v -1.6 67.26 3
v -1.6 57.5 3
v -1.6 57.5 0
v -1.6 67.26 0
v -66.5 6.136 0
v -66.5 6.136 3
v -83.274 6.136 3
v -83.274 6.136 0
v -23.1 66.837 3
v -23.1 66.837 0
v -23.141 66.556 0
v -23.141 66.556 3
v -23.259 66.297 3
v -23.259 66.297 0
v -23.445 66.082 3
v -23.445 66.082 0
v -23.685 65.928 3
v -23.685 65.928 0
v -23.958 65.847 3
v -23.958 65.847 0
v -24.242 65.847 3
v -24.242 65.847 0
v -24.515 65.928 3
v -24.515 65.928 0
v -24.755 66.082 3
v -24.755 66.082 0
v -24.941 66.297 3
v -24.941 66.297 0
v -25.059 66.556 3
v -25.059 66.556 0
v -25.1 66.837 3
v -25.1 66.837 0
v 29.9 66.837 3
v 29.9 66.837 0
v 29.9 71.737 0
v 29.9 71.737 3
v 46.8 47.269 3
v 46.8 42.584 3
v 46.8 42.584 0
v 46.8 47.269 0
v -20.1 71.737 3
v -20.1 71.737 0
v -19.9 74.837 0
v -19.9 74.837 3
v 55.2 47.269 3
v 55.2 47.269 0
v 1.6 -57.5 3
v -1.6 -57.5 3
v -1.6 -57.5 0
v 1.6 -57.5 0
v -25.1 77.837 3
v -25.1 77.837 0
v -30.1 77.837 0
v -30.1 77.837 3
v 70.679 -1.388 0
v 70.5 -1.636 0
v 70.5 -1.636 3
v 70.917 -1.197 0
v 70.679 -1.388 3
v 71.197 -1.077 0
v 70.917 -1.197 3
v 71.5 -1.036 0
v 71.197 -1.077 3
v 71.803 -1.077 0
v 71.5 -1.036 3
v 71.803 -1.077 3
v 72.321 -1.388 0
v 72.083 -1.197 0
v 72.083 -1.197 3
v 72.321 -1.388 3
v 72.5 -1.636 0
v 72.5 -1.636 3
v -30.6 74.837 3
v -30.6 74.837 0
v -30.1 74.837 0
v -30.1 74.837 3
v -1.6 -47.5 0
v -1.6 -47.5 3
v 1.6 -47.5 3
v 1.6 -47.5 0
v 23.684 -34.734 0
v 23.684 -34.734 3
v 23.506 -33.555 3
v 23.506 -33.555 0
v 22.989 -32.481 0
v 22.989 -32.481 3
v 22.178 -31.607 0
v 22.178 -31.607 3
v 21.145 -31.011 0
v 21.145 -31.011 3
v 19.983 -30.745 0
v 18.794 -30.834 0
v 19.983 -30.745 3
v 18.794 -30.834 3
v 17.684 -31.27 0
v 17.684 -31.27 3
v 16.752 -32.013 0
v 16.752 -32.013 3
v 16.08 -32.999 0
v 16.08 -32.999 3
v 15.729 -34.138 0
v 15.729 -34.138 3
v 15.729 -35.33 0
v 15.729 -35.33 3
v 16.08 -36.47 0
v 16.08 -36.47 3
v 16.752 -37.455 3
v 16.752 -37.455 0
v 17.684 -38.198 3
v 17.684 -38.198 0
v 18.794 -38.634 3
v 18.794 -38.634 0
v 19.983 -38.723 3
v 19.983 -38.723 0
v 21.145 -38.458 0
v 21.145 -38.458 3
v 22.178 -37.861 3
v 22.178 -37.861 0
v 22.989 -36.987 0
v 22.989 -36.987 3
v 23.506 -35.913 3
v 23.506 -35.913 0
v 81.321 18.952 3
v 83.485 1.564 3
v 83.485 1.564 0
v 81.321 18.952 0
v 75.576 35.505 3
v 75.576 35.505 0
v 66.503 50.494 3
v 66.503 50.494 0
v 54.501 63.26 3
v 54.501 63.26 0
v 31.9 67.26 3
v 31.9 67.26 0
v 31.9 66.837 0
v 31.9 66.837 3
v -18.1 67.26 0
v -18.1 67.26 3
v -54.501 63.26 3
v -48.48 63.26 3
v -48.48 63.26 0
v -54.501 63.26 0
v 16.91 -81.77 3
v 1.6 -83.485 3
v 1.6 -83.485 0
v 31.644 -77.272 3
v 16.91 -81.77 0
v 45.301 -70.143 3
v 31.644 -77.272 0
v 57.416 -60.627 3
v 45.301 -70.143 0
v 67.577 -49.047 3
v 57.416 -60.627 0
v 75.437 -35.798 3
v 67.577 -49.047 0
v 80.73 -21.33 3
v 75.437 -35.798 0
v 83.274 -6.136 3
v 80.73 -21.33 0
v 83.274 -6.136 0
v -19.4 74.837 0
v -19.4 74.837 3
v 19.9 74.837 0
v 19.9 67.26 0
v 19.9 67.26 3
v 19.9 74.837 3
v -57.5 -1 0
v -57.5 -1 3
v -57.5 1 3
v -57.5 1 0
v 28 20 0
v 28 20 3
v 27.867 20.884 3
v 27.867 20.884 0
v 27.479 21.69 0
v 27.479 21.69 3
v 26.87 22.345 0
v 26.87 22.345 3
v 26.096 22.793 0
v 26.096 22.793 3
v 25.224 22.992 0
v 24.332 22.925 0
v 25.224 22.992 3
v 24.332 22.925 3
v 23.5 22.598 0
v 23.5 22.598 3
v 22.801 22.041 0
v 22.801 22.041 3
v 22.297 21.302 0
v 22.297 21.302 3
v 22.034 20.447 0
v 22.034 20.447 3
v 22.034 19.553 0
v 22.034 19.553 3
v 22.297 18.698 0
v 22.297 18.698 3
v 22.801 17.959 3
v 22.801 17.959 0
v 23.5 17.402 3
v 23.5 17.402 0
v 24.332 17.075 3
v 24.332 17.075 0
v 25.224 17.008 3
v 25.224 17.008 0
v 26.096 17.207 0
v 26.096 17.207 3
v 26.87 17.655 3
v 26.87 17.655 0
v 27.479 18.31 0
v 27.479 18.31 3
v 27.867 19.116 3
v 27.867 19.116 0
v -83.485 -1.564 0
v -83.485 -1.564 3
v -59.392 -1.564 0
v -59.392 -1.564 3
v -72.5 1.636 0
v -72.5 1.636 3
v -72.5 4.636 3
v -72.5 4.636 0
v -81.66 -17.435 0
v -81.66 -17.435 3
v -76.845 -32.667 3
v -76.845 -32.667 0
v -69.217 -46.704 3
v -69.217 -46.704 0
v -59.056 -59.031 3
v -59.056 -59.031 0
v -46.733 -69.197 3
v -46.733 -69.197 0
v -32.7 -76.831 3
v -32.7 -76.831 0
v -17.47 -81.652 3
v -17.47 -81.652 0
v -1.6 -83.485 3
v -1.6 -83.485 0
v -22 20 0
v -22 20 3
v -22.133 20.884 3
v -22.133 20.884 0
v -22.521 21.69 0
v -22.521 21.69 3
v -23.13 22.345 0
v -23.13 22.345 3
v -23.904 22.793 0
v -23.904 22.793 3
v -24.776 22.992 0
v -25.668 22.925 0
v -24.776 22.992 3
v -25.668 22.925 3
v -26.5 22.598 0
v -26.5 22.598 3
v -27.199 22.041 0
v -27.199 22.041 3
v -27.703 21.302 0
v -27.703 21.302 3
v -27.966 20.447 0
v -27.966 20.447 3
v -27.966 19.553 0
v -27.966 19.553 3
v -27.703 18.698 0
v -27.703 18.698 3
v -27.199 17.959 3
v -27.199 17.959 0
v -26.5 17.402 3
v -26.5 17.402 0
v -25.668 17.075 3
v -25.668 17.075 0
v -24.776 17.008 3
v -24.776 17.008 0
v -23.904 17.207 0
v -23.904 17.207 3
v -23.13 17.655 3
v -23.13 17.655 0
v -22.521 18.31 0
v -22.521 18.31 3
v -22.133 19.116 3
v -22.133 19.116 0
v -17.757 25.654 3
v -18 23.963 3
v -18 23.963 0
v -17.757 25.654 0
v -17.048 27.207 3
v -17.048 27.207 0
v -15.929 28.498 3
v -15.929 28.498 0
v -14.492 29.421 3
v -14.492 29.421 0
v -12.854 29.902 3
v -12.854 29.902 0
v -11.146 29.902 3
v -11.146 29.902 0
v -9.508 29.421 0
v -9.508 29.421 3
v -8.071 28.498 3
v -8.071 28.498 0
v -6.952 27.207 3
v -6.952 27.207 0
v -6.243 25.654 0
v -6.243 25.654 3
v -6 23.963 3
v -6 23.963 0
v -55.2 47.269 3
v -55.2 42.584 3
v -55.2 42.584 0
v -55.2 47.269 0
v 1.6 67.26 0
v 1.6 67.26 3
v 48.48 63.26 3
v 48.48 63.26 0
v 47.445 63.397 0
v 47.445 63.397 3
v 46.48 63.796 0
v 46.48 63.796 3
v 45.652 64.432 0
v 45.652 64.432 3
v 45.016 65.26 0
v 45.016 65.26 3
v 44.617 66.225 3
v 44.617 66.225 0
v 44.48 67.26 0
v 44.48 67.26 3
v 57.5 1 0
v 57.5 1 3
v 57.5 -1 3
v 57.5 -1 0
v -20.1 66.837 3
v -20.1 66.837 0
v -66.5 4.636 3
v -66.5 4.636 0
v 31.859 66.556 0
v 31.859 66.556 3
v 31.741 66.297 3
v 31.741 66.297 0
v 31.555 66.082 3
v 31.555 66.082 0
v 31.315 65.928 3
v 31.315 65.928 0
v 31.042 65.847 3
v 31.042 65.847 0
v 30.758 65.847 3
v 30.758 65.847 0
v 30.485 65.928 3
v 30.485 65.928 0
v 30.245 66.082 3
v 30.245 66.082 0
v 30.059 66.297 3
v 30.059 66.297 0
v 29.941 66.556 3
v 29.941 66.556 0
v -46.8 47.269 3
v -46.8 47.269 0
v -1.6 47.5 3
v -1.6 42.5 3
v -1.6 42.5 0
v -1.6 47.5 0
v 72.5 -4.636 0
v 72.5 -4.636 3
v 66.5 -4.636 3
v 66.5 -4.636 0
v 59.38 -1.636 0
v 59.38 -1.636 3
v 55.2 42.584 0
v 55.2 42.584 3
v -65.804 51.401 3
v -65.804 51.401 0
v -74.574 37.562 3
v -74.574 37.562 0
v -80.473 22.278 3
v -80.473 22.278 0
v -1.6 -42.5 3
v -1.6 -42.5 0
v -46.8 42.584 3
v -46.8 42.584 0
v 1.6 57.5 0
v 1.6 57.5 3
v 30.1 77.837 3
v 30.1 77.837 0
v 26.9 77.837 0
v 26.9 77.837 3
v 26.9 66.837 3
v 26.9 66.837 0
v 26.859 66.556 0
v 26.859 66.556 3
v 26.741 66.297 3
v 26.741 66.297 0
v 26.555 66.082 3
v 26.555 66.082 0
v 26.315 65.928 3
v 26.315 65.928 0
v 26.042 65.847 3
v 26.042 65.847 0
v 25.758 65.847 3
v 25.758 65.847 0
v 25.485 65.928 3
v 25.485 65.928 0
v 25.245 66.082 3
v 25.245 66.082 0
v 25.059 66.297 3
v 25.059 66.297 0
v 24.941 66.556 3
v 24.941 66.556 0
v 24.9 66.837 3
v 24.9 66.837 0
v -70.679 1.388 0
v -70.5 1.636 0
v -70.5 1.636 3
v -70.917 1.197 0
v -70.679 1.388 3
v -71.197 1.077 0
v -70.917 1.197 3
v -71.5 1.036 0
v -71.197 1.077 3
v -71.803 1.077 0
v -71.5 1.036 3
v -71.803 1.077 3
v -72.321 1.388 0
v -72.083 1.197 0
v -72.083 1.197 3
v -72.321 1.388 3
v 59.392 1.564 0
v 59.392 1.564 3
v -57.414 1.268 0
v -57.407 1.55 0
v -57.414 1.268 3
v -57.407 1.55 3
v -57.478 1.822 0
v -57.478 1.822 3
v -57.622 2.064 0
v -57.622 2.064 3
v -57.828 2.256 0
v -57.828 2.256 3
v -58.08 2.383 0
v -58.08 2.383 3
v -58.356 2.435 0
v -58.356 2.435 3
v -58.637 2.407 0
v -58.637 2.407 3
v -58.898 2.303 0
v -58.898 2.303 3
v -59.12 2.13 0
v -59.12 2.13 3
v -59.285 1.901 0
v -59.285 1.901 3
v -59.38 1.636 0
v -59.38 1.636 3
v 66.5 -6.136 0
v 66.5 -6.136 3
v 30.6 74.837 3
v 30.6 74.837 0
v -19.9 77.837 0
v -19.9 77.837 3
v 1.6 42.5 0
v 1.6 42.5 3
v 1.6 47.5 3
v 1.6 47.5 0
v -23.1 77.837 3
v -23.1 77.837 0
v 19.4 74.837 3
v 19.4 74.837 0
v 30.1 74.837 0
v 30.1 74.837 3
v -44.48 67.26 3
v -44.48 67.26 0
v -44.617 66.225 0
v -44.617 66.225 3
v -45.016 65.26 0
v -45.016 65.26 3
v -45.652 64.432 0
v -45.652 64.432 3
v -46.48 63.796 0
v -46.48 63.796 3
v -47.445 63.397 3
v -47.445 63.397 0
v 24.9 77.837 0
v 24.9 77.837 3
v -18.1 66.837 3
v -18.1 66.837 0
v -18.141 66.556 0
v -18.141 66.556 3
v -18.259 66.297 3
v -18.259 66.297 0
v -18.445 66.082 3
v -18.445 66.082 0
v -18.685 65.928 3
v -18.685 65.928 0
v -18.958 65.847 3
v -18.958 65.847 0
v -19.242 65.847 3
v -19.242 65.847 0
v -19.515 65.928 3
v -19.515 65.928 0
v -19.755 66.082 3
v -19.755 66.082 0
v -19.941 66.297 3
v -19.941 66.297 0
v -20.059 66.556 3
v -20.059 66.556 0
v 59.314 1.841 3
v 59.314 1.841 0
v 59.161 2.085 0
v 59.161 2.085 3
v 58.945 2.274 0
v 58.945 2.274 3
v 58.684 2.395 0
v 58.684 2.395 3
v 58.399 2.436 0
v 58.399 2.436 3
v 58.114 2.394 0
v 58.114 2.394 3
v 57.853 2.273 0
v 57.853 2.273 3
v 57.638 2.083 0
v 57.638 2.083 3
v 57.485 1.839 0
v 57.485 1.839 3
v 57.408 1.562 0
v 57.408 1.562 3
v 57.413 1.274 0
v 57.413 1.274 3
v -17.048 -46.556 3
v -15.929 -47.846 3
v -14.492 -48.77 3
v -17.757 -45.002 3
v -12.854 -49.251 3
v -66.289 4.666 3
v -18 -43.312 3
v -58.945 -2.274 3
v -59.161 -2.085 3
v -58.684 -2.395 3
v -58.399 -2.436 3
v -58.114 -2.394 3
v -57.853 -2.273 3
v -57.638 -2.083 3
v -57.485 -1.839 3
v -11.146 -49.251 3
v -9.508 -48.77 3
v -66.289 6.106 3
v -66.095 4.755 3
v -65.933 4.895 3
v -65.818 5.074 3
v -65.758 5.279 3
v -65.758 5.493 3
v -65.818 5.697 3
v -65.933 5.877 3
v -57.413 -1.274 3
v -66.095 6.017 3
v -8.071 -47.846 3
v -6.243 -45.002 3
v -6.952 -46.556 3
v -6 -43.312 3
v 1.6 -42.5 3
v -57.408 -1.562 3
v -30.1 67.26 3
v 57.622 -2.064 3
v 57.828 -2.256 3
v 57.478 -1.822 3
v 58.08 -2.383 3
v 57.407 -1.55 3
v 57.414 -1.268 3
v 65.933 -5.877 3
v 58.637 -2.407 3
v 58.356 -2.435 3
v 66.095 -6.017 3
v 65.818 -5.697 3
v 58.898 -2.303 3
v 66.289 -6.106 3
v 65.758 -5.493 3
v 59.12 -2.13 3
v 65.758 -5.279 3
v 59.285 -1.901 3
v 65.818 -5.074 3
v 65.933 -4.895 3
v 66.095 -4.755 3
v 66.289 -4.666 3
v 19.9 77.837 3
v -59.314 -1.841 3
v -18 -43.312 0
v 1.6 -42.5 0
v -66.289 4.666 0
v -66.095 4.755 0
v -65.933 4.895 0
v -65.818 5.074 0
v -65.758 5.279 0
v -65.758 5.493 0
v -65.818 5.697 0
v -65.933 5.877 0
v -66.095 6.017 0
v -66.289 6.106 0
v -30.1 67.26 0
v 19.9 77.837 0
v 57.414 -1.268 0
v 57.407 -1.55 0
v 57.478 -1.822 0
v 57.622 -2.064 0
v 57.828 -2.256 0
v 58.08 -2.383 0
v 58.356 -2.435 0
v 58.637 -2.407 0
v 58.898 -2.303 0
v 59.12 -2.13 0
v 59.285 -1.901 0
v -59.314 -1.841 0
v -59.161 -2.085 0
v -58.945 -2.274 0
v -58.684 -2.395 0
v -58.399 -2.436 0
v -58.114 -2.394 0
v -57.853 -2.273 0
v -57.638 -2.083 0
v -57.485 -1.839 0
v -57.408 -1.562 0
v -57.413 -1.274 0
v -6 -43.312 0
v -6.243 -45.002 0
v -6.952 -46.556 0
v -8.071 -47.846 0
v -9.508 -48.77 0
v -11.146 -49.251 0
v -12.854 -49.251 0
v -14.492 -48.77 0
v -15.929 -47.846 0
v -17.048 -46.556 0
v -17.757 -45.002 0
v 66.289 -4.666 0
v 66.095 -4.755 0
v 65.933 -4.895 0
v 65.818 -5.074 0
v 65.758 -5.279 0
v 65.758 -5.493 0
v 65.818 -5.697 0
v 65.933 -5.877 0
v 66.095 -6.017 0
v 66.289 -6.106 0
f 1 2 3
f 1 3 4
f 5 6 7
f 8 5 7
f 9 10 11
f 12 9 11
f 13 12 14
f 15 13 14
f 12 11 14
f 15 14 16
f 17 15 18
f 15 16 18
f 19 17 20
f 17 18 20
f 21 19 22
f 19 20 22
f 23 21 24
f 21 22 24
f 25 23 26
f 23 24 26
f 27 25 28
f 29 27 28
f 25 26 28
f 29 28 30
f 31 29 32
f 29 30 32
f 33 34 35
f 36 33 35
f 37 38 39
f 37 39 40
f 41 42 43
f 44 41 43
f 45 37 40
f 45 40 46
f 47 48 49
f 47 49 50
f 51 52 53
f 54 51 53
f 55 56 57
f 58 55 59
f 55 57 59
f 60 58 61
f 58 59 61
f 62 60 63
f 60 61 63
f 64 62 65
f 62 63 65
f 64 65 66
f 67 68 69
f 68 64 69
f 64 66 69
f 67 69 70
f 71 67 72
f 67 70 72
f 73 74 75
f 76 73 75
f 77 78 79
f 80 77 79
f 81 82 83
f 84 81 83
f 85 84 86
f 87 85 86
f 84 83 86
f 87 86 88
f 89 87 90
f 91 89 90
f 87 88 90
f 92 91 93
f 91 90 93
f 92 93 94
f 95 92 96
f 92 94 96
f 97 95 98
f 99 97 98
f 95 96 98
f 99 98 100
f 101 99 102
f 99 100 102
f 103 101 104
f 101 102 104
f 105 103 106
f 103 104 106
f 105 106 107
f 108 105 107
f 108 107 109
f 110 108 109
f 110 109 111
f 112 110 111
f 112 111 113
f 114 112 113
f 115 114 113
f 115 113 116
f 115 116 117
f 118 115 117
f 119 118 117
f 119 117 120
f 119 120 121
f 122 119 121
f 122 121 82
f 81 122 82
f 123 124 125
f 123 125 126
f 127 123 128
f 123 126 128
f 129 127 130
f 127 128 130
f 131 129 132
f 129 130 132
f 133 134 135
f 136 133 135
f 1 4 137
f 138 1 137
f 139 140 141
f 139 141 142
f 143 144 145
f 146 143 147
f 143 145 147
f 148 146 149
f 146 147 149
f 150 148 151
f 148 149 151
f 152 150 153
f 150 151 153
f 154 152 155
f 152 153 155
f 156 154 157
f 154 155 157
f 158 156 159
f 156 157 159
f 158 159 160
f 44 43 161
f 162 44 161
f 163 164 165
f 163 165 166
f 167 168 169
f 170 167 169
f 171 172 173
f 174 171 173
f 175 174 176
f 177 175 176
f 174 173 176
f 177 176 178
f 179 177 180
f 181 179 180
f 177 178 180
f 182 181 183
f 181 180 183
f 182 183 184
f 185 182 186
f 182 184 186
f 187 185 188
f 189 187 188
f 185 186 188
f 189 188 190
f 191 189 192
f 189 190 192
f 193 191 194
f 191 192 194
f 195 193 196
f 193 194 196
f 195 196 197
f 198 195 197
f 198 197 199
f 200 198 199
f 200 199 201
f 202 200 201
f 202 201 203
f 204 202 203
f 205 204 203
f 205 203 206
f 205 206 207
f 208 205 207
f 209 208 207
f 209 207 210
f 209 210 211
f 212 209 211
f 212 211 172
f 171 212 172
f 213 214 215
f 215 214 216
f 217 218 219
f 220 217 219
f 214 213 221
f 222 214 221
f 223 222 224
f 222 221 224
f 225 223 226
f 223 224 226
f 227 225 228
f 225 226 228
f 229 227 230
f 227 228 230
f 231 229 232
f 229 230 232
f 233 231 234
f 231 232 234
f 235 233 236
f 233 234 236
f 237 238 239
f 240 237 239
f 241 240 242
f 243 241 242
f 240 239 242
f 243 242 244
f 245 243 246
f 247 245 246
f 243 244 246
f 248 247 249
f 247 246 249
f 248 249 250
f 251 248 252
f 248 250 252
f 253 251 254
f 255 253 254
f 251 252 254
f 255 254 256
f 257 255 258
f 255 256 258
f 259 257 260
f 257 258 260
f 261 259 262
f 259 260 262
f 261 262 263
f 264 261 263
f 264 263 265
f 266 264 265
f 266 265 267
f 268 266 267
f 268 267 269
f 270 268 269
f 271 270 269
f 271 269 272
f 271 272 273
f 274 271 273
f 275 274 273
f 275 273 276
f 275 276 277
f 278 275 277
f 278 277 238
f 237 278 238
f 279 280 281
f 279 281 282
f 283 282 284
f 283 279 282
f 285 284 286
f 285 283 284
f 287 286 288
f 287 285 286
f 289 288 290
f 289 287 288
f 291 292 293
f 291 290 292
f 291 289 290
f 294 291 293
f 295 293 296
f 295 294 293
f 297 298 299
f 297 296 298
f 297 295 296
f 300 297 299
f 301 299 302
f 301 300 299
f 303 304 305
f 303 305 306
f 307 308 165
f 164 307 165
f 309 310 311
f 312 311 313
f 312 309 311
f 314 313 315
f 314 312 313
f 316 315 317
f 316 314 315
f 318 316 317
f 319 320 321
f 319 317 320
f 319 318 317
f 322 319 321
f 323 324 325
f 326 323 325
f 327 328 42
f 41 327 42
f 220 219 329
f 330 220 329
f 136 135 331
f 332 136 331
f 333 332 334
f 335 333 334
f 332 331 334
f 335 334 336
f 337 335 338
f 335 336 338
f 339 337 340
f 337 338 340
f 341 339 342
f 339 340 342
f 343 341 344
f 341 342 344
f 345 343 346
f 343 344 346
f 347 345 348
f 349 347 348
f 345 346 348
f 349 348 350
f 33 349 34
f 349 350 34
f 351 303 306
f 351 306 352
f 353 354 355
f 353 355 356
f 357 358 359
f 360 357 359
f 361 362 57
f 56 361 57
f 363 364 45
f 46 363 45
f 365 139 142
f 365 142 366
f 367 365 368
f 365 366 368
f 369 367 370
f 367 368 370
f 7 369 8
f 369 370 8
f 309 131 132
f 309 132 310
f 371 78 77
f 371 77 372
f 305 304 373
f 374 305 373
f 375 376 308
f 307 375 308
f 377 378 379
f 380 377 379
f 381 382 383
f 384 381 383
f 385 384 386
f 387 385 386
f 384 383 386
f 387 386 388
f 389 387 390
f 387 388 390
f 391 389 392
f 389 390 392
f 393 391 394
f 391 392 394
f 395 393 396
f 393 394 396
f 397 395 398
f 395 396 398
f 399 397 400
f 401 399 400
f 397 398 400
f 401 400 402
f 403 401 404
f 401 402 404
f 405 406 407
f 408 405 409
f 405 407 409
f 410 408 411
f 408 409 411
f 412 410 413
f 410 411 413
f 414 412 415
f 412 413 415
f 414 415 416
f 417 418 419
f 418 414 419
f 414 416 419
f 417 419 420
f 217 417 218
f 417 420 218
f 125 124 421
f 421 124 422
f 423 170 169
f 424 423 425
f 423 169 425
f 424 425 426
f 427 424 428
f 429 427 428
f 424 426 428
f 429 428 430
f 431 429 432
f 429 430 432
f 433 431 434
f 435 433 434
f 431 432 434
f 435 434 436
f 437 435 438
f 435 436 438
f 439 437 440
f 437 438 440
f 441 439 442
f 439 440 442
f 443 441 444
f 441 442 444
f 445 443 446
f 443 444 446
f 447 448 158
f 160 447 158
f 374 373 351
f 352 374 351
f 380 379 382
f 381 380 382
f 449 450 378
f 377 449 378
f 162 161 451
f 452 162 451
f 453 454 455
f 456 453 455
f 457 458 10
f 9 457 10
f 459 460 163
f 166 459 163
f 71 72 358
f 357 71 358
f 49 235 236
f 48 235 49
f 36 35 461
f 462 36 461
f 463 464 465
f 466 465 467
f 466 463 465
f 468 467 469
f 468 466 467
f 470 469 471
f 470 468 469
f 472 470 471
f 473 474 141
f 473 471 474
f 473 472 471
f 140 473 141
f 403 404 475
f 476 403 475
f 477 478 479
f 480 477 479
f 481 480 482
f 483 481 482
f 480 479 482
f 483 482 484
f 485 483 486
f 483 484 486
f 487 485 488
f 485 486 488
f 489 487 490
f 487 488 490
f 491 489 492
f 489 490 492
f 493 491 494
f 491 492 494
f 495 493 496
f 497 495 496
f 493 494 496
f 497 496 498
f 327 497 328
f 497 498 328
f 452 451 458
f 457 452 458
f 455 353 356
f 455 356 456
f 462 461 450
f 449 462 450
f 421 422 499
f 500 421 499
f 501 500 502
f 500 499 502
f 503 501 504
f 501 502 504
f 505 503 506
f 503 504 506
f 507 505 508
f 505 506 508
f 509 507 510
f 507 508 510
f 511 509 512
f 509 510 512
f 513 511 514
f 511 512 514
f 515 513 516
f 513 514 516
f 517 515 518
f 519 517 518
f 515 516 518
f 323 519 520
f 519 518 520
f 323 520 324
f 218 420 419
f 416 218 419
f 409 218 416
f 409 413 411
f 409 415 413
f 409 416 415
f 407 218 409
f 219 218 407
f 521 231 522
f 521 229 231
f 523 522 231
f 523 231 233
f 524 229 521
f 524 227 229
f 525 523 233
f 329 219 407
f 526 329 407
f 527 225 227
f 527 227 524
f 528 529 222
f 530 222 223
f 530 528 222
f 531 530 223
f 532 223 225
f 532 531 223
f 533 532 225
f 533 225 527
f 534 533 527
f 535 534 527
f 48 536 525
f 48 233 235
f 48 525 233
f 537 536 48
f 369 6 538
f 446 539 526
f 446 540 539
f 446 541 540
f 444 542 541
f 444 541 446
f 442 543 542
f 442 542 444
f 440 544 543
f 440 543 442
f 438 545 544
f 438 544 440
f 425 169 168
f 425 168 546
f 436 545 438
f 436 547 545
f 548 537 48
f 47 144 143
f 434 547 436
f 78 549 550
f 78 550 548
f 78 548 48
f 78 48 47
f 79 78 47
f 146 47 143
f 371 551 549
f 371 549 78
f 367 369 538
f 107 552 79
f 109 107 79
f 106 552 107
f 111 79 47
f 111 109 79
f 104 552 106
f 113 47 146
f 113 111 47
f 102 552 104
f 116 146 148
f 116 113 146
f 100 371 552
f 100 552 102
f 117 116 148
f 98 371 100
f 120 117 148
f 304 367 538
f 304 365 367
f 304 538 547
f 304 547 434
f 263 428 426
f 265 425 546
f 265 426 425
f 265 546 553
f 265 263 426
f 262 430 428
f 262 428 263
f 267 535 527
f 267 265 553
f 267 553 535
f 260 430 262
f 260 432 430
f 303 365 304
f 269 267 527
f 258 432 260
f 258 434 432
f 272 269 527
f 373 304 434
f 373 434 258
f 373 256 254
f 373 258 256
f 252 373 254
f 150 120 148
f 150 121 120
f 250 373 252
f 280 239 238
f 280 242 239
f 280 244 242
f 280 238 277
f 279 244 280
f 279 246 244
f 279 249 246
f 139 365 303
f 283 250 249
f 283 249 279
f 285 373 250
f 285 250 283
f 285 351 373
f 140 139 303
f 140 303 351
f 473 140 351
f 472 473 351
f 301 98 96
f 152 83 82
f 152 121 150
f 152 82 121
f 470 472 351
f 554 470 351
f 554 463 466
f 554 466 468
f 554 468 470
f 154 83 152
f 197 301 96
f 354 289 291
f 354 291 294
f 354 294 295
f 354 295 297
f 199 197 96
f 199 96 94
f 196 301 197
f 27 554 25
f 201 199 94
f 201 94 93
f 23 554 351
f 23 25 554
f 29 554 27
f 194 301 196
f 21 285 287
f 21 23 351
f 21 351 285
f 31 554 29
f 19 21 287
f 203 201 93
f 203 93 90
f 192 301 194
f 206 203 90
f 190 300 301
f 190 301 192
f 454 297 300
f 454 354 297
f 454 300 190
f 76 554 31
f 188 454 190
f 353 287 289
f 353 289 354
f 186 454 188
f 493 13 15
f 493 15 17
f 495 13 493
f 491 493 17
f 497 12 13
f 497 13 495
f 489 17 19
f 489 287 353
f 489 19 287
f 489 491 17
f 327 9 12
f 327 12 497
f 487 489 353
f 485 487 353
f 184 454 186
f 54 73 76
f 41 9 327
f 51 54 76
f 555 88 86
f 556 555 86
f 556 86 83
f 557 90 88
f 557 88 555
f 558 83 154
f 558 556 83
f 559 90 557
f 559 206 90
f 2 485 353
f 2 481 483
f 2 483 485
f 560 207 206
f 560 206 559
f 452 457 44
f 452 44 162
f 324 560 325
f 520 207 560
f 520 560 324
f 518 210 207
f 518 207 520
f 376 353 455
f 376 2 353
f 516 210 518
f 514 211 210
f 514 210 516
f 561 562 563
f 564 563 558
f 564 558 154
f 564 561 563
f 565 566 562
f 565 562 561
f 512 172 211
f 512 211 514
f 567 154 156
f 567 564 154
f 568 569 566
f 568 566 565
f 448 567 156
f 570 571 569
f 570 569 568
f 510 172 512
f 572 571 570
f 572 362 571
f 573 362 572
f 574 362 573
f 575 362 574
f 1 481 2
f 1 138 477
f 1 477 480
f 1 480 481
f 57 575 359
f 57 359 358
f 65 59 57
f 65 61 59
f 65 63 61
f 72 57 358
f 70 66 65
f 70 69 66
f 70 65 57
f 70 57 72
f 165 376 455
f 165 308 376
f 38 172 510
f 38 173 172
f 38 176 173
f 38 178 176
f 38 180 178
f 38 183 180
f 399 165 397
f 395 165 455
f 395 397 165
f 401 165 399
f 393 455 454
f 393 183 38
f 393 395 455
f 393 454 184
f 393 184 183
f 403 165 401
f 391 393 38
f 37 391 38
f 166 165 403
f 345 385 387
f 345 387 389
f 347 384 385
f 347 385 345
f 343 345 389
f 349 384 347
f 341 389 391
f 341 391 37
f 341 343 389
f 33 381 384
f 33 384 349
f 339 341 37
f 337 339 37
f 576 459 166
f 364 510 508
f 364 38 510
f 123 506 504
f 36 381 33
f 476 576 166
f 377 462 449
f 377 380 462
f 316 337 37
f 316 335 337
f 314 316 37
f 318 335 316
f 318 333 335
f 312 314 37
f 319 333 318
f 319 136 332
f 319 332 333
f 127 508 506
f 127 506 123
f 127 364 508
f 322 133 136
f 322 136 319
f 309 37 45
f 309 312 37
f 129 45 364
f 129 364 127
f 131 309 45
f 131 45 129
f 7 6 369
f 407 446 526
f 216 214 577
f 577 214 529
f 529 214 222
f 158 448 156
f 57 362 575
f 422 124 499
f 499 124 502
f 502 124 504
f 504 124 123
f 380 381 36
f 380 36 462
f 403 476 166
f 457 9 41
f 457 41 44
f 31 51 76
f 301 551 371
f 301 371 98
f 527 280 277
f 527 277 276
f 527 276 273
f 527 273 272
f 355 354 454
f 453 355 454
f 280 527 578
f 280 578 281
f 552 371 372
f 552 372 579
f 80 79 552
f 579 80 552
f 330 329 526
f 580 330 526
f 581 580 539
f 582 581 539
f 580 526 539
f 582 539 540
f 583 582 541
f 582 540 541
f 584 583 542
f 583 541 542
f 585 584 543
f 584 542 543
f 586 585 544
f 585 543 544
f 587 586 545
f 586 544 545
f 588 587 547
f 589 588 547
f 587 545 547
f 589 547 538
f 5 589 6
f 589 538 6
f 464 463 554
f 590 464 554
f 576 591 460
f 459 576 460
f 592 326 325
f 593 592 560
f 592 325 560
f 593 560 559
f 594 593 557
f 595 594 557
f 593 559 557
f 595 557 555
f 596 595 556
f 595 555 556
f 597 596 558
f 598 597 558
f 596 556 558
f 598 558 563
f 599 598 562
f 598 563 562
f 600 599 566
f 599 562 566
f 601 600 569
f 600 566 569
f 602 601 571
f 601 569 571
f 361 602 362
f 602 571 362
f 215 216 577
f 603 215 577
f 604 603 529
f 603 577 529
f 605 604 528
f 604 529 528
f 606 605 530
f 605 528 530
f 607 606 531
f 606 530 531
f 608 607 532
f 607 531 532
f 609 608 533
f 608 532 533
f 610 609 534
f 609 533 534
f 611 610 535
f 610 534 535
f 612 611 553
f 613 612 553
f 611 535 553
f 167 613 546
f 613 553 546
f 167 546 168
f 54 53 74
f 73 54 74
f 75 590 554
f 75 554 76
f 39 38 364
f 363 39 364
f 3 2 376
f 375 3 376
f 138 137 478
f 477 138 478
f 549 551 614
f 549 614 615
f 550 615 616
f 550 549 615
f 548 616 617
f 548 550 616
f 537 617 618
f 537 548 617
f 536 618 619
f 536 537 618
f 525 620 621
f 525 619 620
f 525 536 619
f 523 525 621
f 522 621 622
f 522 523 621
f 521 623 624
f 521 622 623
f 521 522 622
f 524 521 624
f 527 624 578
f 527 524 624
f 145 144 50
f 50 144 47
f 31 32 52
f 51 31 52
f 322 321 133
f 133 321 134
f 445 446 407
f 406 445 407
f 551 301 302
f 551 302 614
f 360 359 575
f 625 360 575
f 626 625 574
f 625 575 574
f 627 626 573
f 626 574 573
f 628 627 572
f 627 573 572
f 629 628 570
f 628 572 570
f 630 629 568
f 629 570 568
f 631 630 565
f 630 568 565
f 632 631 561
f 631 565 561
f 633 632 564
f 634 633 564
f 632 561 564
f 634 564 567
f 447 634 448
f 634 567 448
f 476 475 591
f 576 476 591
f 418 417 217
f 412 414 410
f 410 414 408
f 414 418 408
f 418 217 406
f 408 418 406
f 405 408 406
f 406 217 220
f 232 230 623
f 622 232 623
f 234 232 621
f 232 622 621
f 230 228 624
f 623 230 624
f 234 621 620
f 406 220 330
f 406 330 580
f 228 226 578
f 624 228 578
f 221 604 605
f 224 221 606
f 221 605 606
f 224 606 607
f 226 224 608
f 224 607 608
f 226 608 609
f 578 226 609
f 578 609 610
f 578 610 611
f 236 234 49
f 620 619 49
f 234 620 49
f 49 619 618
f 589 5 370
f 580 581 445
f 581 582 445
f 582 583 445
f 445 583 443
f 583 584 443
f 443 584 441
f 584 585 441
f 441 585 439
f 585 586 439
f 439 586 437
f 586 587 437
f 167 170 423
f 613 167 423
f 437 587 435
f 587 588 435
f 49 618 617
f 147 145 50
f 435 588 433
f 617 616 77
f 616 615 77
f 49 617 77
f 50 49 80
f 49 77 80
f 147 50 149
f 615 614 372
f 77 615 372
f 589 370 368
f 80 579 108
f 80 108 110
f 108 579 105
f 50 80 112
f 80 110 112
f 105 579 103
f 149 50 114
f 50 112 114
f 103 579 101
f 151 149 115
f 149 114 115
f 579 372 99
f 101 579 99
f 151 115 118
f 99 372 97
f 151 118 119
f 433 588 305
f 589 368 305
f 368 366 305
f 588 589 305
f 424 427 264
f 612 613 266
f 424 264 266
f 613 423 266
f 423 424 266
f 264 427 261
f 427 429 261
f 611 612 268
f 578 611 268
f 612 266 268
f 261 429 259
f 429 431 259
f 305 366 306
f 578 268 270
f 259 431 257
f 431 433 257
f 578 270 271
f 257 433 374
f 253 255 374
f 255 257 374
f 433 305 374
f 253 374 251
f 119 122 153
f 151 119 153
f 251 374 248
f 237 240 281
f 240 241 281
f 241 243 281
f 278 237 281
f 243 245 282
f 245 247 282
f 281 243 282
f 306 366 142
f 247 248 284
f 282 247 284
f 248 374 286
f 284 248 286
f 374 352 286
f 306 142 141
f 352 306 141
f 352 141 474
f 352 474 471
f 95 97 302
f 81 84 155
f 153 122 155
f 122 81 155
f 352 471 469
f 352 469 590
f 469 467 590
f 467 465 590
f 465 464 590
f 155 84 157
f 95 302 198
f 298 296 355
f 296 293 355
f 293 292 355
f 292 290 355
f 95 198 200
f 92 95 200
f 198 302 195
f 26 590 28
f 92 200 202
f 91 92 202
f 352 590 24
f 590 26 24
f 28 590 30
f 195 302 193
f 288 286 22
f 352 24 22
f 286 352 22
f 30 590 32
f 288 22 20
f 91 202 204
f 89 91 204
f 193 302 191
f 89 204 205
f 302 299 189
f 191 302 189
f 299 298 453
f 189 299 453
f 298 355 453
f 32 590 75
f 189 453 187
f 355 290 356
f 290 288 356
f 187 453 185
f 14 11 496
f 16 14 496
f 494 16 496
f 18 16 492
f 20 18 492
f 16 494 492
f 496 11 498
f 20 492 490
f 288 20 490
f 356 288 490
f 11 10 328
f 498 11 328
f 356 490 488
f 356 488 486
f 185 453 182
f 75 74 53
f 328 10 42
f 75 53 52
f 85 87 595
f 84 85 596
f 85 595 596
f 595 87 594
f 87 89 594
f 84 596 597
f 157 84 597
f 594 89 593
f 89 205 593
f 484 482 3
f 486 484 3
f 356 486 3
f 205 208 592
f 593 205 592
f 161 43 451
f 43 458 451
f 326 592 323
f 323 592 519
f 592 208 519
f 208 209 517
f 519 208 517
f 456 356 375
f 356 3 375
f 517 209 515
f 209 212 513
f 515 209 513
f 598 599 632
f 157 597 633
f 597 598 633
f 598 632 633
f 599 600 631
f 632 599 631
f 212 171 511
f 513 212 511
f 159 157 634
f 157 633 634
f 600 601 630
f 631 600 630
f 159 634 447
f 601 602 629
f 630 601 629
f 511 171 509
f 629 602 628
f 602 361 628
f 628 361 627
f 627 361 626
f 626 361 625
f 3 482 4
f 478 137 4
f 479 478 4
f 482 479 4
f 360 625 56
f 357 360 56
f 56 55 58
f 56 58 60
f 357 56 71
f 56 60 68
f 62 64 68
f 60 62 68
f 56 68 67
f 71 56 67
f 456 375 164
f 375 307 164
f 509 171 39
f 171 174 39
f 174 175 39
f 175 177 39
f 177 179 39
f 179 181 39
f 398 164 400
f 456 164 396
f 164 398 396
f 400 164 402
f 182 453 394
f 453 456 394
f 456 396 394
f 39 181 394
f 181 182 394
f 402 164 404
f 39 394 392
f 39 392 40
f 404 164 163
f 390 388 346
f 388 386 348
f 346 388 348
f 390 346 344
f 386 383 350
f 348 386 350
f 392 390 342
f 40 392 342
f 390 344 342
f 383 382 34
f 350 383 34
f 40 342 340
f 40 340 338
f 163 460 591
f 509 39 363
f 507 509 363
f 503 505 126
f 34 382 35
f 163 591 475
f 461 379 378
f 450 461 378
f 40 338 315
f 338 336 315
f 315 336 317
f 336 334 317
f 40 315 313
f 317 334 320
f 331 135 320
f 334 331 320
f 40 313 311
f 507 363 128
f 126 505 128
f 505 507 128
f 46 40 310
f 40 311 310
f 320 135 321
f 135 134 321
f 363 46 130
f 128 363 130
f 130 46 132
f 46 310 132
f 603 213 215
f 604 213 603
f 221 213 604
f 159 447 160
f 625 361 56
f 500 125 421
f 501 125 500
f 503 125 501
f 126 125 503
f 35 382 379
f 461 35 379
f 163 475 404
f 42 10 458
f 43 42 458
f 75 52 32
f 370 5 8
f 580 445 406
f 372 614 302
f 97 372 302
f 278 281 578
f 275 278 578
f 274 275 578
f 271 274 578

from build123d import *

# Parameters (mm, degrees)
SKETCH1_R                     = 83.5
BOSS_EXTRUDE1_DEPTH           = 3
FACE_FLATTENING_REACH         = 120.125
SKETCH10_W                    = 98.960633138
SKETCH10_H                    = 16.23969765
SIDE_RIB_SLOT_DEPTH           = 10
RIB_TAB_CLEARANCE_SLOT_REACH  = 120.125
SKETCH5_W                     = 3.2
SKETCH5_H                     = 5
SKETCH5_H_2                   = 26
SIDE_RIB_SLOT_PATTERN_COUNT   = 2
EYE_PLATE_SLOTS_REACH         = 120.104
SKETCH3_R                     = 3
SKETCH3_W                     = 8.4
SKETCH3_H                     = 4.684444021
FACE_START                    = -3
FACE_PLATE_TABS_OUTLINE_W     = 2
FACE_PLATE_TABS_OUTLINE_H     = 4.476977338
FACE_PLATE_TABS_DEPTH         = 3
SKETCH11_W                    = 2
SKETCH11_H                    = 4.476977338
FACE_PLATE_TAB_RELIEF_DEPTH   = 3
ACTUATOR_CLEARANCE_SLOT_REACH = 120.104
SKETCH4_R                     = 4
EYE_PLATE_RELIEF_REACH        = 120.104


# Read off the part's stored shape, not the designer's step: face plate tabs
with BuildPart() as part:
    # Sketch1 → Boss-Extrude1 (new body)
    with BuildSketch(Plane.XY):
        Circle(SKETCH1_R)
    extrude(amount=BOSS_EXTRUDE1_DEPTH)

    # Sketch10 → face flattening (cut, up to next)
    with BuildSketch(Plane.XY.offset(3), mode=Mode.PRIVATE) as face_flattening_sk1:
        with Locations((0, 75.380151175)):
            Rectangle(SKETCH10_W, SKETCH10_H)
    face_flattening_tool1 = extrude(face_flattening_sk1.sketch, amount=-FACE_FLATTENING_REACH, mode=Mode.PRIVATE) & part.part
    add(face_flattening_tool1.solids().sort_by_distance((0, 75.380151, 3))[0], mode=Mode.SUBTRACT)

    # Sketch7 → side rib slot (cut)
    with BuildSketch(Plane.XY.offset(3)):
        with BuildLine():
            Line((-72.5, 1.635889894), (-72.5, 4.635889894))
            Line((-72.5, 4.635889894), (-66.5, 4.635889894))
            ThreePointArc((-66.5, 4.635889894), (-65.75, 5.385889894), (-66.5, 6.135889894))
            Line((-66.5, 6.135889894), (-87.5, 6.135889894))
            Line((-87.5, 6.135889894), (-87.5, -1.564110106))
            Line((-87.5, -1.564110106), (-72.5, -1.564110106))
            Line((-72.5, -1.564110106), (-59.391745722, -1.564110106))
            ThreePointArc((-59.391745722, -1.564110106), (-58.11423896, -2.394190801), (-57.5, -1))
            Line((-57.5, -1), (-57.5, 1))
            ThreePointArc((-57.5, 1), (-58.079561495, 2.383159214), (-59.379795897, 1.635889894))
            Line((-59.379795897, 1.635889894), (-70.5, 1.635889894))
            ThreePointArc((-70.5, 1.635889894), (-71.5, 1.035889894), (-72.5, 1.635889894))
        make_face()
    side_rib_slot = extrude(amount=-SIDE_RIB_SLOT_DEPTH, mode=Mode.SUBTRACT)

    # Sketch5 → rib tab clearance slot (cut, up to next)
    with BuildSketch(Plane.XY.offset(3), mode=Mode.PRIVATE) as rib_tab_clearance_slot_sk1:
        with Locations((0, 45)):
            Rectangle(SKETCH5_W, SKETCH5_H)
    rib_tab_clearance_slot_tool1 = extrude(rib_tab_clearance_slot_sk1.sketch, amount=-RIB_TAB_CLEARANCE_SLOT_REACH, mode=Mode.PRIVATE) & part.part
    # Sketch5 → rib tab clearance slot (cut, up to next)
    with BuildSketch(Plane.XY.offset(3), mode=Mode.PRIVATE) as rib_tab_clearance_slot_sk2:
        with Locations((0, 70.5)):
            Rectangle(SKETCH5_W, SKETCH5_H_2)
    rib_tab_clearance_slot_tool2 = extrude(rib_tab_clearance_slot_sk2.sketch, amount=-RIB_TAB_CLEARANCE_SLOT_REACH, mode=Mode.PRIVATE) & part.part
    # Sketch5 → rib tab clearance slot (cut, up to next)
    with BuildSketch(Plane.XY.offset(3), mode=Mode.PRIVATE) as rib_tab_clearance_slot_sk3:
        with Locations((0, -70.5)):
            Rectangle(SKETCH5_W, SKETCH5_H_2)
    rib_tab_clearance_slot_tool3 = extrude(rib_tab_clearance_slot_sk3.sketch, amount=-RIB_TAB_CLEARANCE_SLOT_REACH, mode=Mode.PRIVATE) & part.part
    # Sketch5 → rib tab clearance slot (cut, up to next)
    with BuildSketch(Plane.XY.offset(3), mode=Mode.PRIVATE) as rib_tab_clearance_slot_sk4:
        with Locations((0, -45)):
            Rectangle(SKETCH5_W, SKETCH5_H)
    rib_tab_clearance_slot_tool4 = extrude(rib_tab_clearance_slot_sk4.sketch, amount=-RIB_TAB_CLEARANCE_SLOT_REACH, mode=Mode.PRIVATE) & part.part
    add(rib_tab_clearance_slot_tool1.solids().sort_by_distance((0, 45, 3))[0], mode=Mode.SUBTRACT)
    add(rib_tab_clearance_slot_tool2.solids().sort_by_distance((0, 70.5, 3))[0], mode=Mode.SUBTRACT)
    add(rib_tab_clearance_slot_tool3.solids().sort_by_distance((0, -70.5, 3))[0], mode=Mode.SUBTRACT)
    add(rib_tab_clearance_slot_tool4.solids().sort_by_distance((0, -45, 3))[0], mode=Mode.SUBTRACT)

    # side rib slot pattern: side rib slot ×2 about axis
    side_rib_slot_pattern_axis = Axis((0, 0, 0), (0, 0, 1))
    for i in range(1, SIDE_RIB_SLOT_PATTERN_COUNT):
        add(side_rib_slot.rotate(side_rib_slot_pattern_axis, i * 360 / SIDE_RIB_SLOT_PATTERN_COUNT), mode=Mode.SUBTRACT)

    # Sketch3 → eye plate slots (cut, up to next)
    with BuildSketch(Plane.XY.offset(3), mode=Mode.PRIVATE) as eye_plate_slots_sk1:
        with Locations((-25, 20)):
            Circle(SKETCH3_R)
    eye_plate_slots_tool1 = extrude(eye_plate_slots_sk1.sketch, amount=-EYE_PLATE_SLOTS_REACH, mode=Mode.PRIVATE) & part.part
    # Sketch3 → eye plate slots (cut, up to next)
    with BuildSketch(Plane.XY.offset(3), mode=Mode.PRIVATE) as eye_plate_slots_sk2:
        with Locations((25, 20)):
            Circle(SKETCH3_R)
    eye_plate_slots_tool2 = extrude(eye_plate_slots_sk2.sketch, amount=-EYE_PLATE_SLOTS_REACH, mode=Mode.PRIVATE) & part.part
    # Sketch3 → eye plate slots (cut, up to next)
    with BuildSketch(Plane.XY.offset(3), mode=Mode.PRIVATE) as eye_plate_slots_sk3:
        with Locations((-51, 44.926435594)):
            Rectangle(SKETCH3_W, SKETCH3_H)
    eye_plate_slots_tool3 = extrude(eye_plate_slots_sk3.sketch, amount=-EYE_PLATE_SLOTS_REACH, mode=Mode.PRIVATE) & part.part
    # Sketch3 → eye plate slots (cut, up to next)
    with BuildSketch(Plane.XY.offset(3), mode=Mode.PRIVATE) as eye_plate_slots_sk4:
        with Locations((51, 44.926435594)):
            Rectangle(SKETCH3_W, SKETCH3_H)
    eye_plate_slots_tool4 = extrude(eye_plate_slots_sk4.sketch, amount=-EYE_PLATE_SLOTS_REACH, mode=Mode.PRIVATE) & part.part
    add(eye_plate_slots_tool1.solids().sort_by_distance((-25, 20, 3))[0], mode=Mode.SUBTRACT)
    add(eye_plate_slots_tool2.solids().sort_by_distance((25, 20, 3))[0], mode=Mode.SUBTRACT)
    add(eye_plate_slots_tool3.solids().sort_by_distance((-51, 44.926436, 3))[0], mode=Mode.SUBTRACT)
    add(eye_plate_slots_tool4.solids().sort_by_distance((51, 44.926436, 3))[0], mode=Mode.SUBTRACT)

    # face plate tabs outline → face plate tabs (add)
    with BuildSketch(Plane.XY.offset(3).offset(FACE_START)):
        Polygon((24.9, 67.26030235), (24.9, 77.837279688), (19.9, 77.837279688), (19.4, 74.837279688), (19.9, 74.837279688), (19.9, 71.737279688), (17.9, 71.737279688), (17.9, 67.26030235), align=None)
        with Locations((32.9, 69.498791019)):
            Rectangle(FACE_PLATE_TABS_OUTLINE_W, FACE_PLATE_TABS_OUTLINE_H)
        Polygon((26.9, 77.837279688), (26.9, 67.26030235), (29.9, 67.26030235), (29.9, 71.737279688), (30.1, 74.837279688), (30.6, 74.837279688), (30.1, 77.837279688), align=None)
        Polygon((-25.1, 67.26030235), (-25.1, 77.837279688), (-30.1, 77.837279688), (-30.6, 74.837279688), (-30.1, 74.837279688), (-30.1, 71.737279688), (-32.1, 71.737279688), (-32.1, 67.26030235), align=None)
        with Locations((-17.1, 69.498791019)):
            Rectangle(FACE_PLATE_TABS_OUTLINE_W, FACE_PLATE_TABS_OUTLINE_H)
        Polygon((-23.1, 77.837279688), (-23.1, 67.26030235), (-20.1, 67.26030235), (-20.1, 71.737279688), (-19.9, 74.837279688), (-19.4, 74.837279688), (-19.9, 77.837279688), align=None)
    extrude(amount=FACE_PLATE_TABS_DEPTH)

    # Sketch11 → face plate tab relief (cut)
    with BuildSketch(Plane.XY.offset(3).offset(FACE_START)):
        with BuildLine():
            Line((29.9, 66.837279688), (29.9, 67.26030235))
            Line((29.9, 67.26030235), (31.9, 71.737279688))
            Line((31.9, 71.737279688), (33.9, 71.737279688))
            Line((33.9, 71.737279688), (33.9, 67.26030235))
            Line((33.9, 67.26030235), (31.9, 67.26030235))
            Line((31.9, 67.26030235), (31.9, 66.837279688))
            ThreePointArc((31.9, 66.837279688), (30.9, 65.837279688), (29.9, 66.837279688))
        make_face()
        with BuildLine():
            Line((24.9, 66.837279688), (24.9, 67.26030235))
            Line((24.9, 67.26030235), (26.9, 67.26030235))
            Line((26.9, 67.26030235), (26.9, 66.837279688))
            ThreePointArc((26.9, 66.837279688), (25.9, 65.837279688), (24.9, 66.837279688))
        make_face()
        with Locations((18.9, 69.498791019)):
            Rectangle(SKETCH11_W, SKETCH11_H)
        with BuildLine():
            Line((-25.1, 66.837279688), (-25.1, 67.26030235))
            Line((-25.1, 67.26030235), (-23.1, 67.26030235))
            Line((-23.1, 67.26030235), (-23.1, 66.837279688))
            ThreePointArc((-23.1, 66.837279688), (-24.1, 65.837279688), (-25.1, 66.837279688))
        make_face()
        with BuildLine():
            Line((-20.1, 66.837279688), (-20.1, 67.26030235))
            Line((-20.1, 67.26030235), (-18.1, 71.737279688))
            Line((-18.1, 71.737279688), (-16.1, 71.737279688))
            Line((-16.1, 71.737279688), (-16.1, 67.26030235))
            Line((-16.1, 67.26030235), (-18.1, 67.26030235))
            Line((-18.1, 67.26030235), (-18.1, 66.837279688))
            ThreePointArc((-18.1, 66.837279688), (-19.1, 65.837279688), (-20.1, 66.837279688))
        make_face()
        with Locations((-31.1, 69.498791019)):
            Rectangle(SKETCH11_W, SKETCH11_H)
    extrude(amount=FACE_PLATE_TAB_RELIEF_DEPTH, mode=Mode.SUBTRACT)

    # Sketch4 → actuator clearance slot (cut, up to next)
    with BuildSketch(Plane.XY.offset(3), mode=Mode.PRIVATE) as actuator_clearance_slot_sk1:
        with Locations((19.684125428, -34.734157019)):
            Circle(SKETCH4_R)
    actuator_clearance_slot_tool1 = extrude(actuator_clearance_slot_sk1.sketch, amount=-ACTUATOR_CLEARANCE_SLOT_REACH, mode=Mode.PRIVATE) & part.part
    # Sketch4 → actuator clearance slot (cut, up to next)
    with BuildSketch(Plane.XY.offset(3), mode=Mode.PRIVATE) as actuator_clearance_slot_sk2:
        with BuildLine():
            Line((-6, 23.963301095), (-6, -43.311948564))
            ThreePointArc((-6, -43.311948564), (-12, -49.311948564), (-18, -43.311948564))
            Line((-18, -43.311948564), (-18, 23.963301095))
            ThreePointArc((-18, 23.963301095), (-12, 29.963301095), (-6, 23.963301095))
        make_face()
    actuator_clearance_slot_tool2 = extrude(actuator_clearance_slot_sk2.sketch, amount=-ACTUATOR_CLEARANCE_SLOT_REACH, mode=Mode.PRIVATE) & part.part
    add(actuator_clearance_slot_tool1.solids().sort_by_distance((19.684125, -34.734157, 3))[0], mode=Mode.SUBTRACT)
    add(actuator_clearance_slot_tool2.solids().sort_by_distance((-12, -9.674324, 3))[0], mode=Mode.SUBTRACT)

    # Sketch12 → eye plate relief (cut, up to next)
    with BuildSketch(Plane.XY.offset(3), mode=Mode.PRIVATE) as eye_plate_relief_sk1:
        with BuildLine():
            Line((54.501230688, 63.26030235), (48.480316569, 63.26030235))
            ThreePointArc((48.480316569, 63.26030235), (45.651889444, 64.431875226), (44.480316569, 67.26030235))
            Line((44.480316569, 67.26030235), (54.501230688, 67.26030235))
            Line((54.501230688, 67.26030235), (54.501230688, 63.26030235))
        make_face()
    eye_plate_relief_tool1 = extrude(eye_plate_relief_sk1.sketch, amount=-EYE_PLATE_RELIEF_REACH, mode=Mode.PRIVATE) & part.part
    # Sketch12 → eye plate relief (cut, up to next)
    with BuildSketch(Plane.XY.offset(3), mode=Mode.PRIVATE) as eye_plate_relief_sk2:
        with BuildLine():
            Line((-54.501230688, 67.26030235), (-44.480316569, 67.26030235))
            ThreePointArc((-44.480316569, 67.26030235), (-45.651889444, 64.431875226), (-48.480316569, 63.26030235))
            Line((-48.480316569, 63.26030235), (-54.501230688, 63.26030235))
            Line((-54.501230688, 63.26030235), (-54.501230688, 67.26030235))
        make_face()
    eye_plate_relief_tool2 = extrude(eye_plate_relief_sk2.sketch, amount=-EYE_PLATE_RELIEF_REACH, mode=Mode.PRIVATE) & part.part
    add(eye_plate_relief_tool1.solids().sort_by_distance((49.876481, 65.36397, 3))[0], mode=Mode.SUBTRACT)
    add(eye_plate_relief_tool2.solids().sort_by_distance((-49.876481, 65.36397, 3))[0], mode=Mode.SUBTRACT)


solid = part.part
